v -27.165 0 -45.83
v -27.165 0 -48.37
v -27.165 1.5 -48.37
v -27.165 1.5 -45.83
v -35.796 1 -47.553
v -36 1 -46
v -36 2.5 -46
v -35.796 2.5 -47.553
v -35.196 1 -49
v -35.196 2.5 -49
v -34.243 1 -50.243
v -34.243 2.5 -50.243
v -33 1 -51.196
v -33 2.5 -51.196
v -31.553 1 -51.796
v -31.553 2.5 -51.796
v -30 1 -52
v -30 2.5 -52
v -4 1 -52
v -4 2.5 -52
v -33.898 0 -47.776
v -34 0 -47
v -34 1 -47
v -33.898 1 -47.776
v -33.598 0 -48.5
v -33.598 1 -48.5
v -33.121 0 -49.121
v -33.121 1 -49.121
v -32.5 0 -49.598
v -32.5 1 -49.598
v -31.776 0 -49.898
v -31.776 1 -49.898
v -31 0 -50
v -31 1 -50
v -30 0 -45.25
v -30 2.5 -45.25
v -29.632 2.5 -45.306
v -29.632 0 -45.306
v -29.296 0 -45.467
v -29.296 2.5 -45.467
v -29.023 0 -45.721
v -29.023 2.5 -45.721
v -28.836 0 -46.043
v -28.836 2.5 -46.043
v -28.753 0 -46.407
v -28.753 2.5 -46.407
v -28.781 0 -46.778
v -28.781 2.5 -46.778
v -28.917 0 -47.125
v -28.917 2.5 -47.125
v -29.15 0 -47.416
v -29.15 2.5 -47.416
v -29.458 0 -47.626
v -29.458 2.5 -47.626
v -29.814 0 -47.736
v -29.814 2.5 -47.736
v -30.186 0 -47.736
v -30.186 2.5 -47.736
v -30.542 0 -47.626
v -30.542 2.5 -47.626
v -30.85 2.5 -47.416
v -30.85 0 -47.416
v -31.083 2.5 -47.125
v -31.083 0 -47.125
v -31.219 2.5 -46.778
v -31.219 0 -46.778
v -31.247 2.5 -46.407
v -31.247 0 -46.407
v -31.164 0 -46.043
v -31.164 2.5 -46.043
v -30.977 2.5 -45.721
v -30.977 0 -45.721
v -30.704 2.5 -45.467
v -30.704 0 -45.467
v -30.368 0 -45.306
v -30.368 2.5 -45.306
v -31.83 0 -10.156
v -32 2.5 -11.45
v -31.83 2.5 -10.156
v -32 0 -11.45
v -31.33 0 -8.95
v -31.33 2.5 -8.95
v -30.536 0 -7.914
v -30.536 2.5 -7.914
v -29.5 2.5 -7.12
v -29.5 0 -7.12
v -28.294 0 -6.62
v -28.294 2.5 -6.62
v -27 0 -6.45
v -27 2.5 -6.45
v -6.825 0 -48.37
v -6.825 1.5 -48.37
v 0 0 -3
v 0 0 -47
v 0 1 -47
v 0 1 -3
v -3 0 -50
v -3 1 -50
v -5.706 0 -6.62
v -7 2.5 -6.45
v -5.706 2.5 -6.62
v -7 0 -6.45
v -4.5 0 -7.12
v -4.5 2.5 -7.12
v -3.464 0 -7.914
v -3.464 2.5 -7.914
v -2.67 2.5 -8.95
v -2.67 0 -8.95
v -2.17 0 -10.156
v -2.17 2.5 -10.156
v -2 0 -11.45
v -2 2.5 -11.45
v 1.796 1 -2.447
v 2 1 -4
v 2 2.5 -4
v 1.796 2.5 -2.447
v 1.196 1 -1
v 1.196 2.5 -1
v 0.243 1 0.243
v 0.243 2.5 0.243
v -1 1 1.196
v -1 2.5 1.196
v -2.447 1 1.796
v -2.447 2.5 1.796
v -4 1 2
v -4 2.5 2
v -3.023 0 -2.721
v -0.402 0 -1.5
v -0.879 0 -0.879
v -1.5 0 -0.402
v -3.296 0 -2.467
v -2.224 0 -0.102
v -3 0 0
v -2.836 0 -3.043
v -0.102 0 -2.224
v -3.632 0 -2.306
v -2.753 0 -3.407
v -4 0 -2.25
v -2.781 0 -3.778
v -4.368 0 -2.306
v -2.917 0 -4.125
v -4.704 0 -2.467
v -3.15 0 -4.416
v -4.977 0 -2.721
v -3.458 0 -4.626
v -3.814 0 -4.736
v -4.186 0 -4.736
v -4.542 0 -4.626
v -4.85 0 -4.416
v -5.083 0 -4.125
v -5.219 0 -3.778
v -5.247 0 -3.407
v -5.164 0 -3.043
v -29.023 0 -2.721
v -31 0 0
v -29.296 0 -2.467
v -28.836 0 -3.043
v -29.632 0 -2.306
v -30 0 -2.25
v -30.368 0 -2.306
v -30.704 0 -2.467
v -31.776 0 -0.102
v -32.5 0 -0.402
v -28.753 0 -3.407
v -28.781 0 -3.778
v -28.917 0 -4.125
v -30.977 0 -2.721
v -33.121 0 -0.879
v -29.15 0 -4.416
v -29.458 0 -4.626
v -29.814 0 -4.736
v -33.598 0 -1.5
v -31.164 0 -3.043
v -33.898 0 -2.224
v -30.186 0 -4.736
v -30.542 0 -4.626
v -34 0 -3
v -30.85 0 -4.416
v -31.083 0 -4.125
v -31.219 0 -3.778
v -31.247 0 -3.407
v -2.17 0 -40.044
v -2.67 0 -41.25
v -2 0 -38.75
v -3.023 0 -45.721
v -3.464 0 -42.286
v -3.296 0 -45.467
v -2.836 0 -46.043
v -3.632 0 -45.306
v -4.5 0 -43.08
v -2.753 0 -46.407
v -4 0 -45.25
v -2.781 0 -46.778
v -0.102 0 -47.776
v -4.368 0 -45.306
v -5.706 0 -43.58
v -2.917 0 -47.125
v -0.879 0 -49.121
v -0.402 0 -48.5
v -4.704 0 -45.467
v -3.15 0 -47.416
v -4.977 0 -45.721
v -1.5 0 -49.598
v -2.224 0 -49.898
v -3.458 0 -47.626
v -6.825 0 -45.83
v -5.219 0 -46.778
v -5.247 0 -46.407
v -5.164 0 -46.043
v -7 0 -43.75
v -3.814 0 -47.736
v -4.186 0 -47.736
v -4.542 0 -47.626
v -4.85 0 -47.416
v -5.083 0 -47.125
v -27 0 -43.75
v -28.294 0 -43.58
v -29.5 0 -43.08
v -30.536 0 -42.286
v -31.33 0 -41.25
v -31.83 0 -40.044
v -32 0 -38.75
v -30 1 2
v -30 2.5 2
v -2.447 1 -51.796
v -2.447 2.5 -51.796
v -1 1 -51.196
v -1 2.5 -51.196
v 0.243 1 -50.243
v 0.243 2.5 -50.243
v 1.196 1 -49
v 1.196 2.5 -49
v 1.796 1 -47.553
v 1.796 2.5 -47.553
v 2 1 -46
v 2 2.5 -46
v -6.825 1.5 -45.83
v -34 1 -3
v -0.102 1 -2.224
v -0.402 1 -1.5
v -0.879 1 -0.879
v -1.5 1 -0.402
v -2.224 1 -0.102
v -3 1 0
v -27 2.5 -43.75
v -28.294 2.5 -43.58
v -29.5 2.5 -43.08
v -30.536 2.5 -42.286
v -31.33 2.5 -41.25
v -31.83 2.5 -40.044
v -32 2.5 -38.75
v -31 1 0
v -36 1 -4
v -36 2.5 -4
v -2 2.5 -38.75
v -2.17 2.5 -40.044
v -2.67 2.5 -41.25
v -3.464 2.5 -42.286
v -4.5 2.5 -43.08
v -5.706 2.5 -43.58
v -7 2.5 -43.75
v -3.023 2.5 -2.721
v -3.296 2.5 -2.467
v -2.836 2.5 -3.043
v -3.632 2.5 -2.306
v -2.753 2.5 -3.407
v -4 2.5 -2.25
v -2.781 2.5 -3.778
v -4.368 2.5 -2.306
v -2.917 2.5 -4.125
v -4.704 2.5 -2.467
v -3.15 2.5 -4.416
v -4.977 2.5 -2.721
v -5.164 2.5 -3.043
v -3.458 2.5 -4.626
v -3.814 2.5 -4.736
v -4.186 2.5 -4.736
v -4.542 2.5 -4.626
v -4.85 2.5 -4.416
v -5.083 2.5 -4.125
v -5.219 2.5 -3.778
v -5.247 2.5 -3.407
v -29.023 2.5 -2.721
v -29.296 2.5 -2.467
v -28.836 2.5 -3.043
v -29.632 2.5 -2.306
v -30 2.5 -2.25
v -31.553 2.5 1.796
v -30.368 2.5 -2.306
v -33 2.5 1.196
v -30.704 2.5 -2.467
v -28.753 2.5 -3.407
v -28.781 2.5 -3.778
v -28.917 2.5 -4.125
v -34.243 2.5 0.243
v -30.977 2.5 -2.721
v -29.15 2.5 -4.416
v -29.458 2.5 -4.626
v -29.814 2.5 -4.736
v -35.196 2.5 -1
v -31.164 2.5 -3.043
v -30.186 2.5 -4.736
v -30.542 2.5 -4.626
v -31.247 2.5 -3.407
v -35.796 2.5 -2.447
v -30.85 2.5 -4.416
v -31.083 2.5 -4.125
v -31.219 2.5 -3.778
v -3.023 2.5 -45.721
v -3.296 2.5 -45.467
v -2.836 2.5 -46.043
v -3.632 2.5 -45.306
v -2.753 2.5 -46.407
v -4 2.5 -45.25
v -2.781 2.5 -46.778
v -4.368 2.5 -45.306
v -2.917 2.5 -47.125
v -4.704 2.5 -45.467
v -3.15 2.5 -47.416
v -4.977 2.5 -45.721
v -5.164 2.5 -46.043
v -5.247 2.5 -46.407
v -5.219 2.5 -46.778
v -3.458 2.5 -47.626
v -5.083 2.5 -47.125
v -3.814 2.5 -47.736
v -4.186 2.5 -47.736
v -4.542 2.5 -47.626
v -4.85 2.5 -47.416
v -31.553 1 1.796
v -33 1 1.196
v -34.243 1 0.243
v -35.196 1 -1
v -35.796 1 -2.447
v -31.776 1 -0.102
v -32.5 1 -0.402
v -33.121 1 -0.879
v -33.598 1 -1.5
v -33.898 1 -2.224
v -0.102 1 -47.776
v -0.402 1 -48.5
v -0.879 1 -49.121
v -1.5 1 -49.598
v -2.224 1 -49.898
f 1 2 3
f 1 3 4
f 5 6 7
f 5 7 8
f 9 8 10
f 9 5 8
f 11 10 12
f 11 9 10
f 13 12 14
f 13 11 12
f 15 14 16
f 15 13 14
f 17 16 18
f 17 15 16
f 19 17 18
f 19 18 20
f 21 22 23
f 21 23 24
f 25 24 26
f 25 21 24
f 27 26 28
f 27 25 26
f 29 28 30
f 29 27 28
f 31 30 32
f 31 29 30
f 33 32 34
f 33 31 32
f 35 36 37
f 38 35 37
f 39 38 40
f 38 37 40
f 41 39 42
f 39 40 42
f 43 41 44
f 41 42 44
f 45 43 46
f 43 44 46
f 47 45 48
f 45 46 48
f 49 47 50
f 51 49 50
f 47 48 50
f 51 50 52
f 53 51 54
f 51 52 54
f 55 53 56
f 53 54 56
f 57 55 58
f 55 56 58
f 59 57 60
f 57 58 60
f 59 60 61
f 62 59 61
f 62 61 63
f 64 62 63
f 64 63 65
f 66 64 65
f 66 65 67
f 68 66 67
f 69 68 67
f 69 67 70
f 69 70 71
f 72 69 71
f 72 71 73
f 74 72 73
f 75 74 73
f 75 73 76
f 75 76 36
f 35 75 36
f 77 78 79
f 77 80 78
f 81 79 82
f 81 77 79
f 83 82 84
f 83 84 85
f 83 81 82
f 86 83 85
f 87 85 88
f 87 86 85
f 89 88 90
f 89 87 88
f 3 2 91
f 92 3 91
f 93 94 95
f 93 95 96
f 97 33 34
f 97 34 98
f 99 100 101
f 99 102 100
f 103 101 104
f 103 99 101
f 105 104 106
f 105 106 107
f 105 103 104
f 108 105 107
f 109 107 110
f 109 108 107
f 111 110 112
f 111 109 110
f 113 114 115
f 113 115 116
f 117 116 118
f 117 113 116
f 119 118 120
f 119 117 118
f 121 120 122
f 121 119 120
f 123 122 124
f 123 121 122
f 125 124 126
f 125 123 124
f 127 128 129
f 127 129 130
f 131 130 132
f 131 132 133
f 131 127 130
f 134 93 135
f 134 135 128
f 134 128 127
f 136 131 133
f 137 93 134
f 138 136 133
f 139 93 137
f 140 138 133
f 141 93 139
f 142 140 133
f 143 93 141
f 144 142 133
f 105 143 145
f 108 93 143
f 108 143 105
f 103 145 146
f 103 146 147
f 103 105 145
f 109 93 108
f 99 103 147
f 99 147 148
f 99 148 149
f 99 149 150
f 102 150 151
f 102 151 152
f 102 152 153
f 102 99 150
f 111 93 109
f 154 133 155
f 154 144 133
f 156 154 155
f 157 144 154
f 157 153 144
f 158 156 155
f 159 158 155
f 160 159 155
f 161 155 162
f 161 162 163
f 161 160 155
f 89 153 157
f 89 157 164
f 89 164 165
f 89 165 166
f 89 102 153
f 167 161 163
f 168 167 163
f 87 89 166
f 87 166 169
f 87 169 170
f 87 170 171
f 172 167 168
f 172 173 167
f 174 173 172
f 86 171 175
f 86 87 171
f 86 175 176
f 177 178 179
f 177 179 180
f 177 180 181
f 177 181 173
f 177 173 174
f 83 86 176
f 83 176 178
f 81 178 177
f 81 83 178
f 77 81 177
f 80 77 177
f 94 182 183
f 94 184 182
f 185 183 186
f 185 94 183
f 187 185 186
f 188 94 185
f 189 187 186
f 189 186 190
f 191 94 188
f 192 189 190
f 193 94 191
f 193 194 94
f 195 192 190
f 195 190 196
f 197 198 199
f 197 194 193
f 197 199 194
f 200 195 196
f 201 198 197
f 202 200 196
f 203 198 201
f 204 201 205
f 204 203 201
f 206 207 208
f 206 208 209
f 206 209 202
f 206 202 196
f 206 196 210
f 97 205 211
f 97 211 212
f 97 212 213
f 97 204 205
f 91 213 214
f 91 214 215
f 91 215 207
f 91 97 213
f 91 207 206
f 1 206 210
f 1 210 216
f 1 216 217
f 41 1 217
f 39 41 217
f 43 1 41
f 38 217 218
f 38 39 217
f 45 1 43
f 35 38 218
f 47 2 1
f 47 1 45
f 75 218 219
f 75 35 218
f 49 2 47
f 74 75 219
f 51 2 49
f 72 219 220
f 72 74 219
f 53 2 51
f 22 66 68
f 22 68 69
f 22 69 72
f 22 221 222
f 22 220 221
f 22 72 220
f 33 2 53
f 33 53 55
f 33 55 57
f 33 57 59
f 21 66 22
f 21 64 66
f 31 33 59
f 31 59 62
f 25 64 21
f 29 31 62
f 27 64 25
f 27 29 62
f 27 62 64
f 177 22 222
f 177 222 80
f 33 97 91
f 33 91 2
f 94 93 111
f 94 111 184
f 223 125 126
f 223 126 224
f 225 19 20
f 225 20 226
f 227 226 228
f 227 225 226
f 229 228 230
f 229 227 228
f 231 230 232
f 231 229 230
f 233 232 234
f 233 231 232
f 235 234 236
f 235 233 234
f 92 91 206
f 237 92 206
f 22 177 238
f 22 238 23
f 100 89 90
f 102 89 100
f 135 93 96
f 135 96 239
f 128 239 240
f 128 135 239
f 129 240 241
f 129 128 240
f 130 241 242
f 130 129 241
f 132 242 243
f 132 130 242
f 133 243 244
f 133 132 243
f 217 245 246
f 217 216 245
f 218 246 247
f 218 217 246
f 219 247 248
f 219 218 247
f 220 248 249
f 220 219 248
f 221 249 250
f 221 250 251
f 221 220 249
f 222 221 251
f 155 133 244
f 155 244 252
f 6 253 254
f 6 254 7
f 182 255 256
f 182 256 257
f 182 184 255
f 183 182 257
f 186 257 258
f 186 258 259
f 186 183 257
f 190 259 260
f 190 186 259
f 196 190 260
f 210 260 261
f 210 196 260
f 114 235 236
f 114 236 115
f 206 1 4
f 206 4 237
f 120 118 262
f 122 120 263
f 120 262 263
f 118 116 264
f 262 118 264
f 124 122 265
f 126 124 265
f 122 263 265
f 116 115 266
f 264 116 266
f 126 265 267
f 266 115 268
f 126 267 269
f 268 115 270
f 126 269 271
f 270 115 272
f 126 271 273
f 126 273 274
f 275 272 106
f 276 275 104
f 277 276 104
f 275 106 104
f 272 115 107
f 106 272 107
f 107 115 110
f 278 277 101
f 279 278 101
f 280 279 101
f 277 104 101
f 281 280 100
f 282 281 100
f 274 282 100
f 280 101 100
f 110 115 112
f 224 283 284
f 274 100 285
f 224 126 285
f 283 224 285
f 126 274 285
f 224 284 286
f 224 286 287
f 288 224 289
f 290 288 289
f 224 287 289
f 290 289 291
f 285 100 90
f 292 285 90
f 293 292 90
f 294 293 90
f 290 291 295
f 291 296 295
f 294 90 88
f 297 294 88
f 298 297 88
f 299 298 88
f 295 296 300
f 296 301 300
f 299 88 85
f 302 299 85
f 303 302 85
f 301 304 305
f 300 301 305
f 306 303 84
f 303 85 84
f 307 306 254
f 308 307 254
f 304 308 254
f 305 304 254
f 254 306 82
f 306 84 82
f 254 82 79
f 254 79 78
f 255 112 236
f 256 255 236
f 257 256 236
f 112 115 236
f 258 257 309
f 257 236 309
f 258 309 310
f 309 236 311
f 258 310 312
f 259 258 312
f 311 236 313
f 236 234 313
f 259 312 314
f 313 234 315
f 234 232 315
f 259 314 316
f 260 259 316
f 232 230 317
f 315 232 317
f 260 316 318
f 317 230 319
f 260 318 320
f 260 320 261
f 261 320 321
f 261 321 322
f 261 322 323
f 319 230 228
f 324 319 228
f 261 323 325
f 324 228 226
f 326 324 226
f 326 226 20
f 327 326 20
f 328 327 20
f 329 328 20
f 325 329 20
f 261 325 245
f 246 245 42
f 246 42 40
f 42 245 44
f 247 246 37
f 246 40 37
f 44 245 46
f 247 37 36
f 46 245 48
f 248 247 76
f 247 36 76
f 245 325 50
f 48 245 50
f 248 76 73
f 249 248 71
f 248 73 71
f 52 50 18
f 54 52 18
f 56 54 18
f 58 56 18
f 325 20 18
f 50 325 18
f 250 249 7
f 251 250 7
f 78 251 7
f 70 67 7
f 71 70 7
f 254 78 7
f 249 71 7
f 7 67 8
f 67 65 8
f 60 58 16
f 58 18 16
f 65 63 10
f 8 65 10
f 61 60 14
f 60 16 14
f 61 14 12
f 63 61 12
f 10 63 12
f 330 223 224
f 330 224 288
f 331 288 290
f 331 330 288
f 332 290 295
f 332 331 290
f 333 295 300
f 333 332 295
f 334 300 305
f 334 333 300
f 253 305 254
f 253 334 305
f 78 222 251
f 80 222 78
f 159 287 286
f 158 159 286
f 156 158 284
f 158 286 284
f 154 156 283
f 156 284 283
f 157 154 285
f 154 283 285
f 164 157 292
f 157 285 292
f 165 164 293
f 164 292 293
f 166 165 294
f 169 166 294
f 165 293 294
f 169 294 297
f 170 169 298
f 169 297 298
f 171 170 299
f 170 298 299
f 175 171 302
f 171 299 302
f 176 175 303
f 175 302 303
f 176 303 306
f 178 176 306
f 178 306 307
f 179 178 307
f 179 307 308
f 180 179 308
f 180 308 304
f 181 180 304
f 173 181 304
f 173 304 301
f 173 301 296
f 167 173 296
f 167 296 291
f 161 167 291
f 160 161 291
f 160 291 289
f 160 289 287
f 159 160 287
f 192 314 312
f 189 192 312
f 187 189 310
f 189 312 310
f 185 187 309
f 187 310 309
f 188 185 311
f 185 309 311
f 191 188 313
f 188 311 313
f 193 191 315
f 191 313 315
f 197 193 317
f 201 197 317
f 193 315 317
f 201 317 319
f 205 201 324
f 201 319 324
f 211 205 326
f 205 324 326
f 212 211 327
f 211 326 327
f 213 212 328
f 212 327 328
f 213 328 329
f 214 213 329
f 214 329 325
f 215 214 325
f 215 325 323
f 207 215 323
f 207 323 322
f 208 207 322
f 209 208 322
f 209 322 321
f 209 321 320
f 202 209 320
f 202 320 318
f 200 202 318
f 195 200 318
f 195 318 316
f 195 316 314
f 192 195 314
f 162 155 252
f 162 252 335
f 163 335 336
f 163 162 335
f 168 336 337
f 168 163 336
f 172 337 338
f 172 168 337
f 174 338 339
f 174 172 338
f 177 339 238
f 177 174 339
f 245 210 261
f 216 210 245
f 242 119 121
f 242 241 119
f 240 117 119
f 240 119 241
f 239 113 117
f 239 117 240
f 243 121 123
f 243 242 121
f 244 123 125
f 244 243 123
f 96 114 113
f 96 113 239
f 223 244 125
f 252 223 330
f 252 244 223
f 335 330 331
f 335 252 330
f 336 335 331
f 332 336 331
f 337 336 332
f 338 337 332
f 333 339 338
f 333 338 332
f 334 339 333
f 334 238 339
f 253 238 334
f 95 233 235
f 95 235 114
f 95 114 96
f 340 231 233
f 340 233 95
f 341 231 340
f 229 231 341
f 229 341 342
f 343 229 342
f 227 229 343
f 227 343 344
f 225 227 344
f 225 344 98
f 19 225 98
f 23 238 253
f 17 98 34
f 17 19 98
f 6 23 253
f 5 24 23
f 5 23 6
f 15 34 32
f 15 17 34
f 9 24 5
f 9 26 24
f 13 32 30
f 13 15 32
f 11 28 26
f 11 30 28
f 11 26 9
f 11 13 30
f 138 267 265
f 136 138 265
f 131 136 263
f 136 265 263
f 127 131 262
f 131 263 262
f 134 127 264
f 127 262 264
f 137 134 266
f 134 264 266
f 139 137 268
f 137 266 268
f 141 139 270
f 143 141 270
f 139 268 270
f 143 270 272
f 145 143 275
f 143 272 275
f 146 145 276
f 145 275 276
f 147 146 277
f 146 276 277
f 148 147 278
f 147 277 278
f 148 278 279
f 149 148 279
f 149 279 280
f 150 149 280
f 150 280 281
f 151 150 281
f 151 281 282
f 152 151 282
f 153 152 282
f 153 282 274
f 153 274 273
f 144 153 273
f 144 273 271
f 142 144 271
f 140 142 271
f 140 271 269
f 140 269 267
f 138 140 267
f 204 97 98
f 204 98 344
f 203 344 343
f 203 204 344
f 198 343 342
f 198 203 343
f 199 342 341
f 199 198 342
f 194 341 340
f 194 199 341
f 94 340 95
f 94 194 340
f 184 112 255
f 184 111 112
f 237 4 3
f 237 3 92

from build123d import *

# Parameters (mm, degrees)
ESTRUSIONE_ESTRUSIONE1_DEPTH = 1
ESTRUSIONE_ESTRUSIONE2_DEPTH = 1.5
SCHIZZO4_W                   = 20.34
SCHIZZO4_H                   = 2.54
TAGLIO_ESTRUSIONE1_DEPTH     = 1.5
SCHIZZO5_R                   = 1.25
TAGLIO_ESTRUSIONE2_DEPTH     = 10


with BuildPart() as part:
    # Schizzo2 → Estrusione-Estrusione1 (new body)
    with BuildSketch(Plane(origin=(0, 0, 0), x_dir=(1, 0, 0), z_dir=(0, 1, 0))):
        with BuildLine():
            Line((-3, 0), (-31, 0))
            ThreePointArc((-31, 0), (-33.121320344, 0.878679656), (-34, 3))
            Line((-34, 3), (-34, 47))
            ThreePointArc((-34, 47), (-33.121320344, 49.121320344), (-31, 50))
            Line((-31, 50), (-3, 50))
            ThreePointArc((-3, 50), (-0.878679656, 49.121320344), (0, 47))
            Line((0, 47), (0, 3))
            ThreePointArc((0, 3), (-0.878679656, 0.878679656), (-3, 0))
        make_face()
        with BuildLine():
            Line((-27, 43.75), (-7, 43.75))
            ThreePointArc((-7, 43.75), (-3.464466094, 42.285533906), (-2, 38.75))
            Line((-2, 38.75), (-2, 11.45))
            ThreePointArc((-2, 11.45), (-3.464466094, 7.914466094), (-7, 6.45))
            Line((-7, 6.45), (-27, 6.45))
            ThreePointArc((-27, 6.45), (-30.535533906, 7.914466094), (-32, 11.45))
            Line((-32, 11.45), (-32, 38.75))
            ThreePointArc((-32, 38.75), (-30.535533906, 42.285533906), (-27, 43.75))
        make_face(mode=Mode.SUBTRACT)
    extrude(amount=ESTRUSIONE_ESTRUSIONE1_DEPTH)

    # Schizzo3 → Estrusione-Estrusione2 (add)
    with BuildSketch(Plane(origin=(0, 1, 0), x_dir=(1, 0, 0), z_dir=(0, 1, 0))):
        with BuildLine():
            Line((-30, 52), (-4, 52))
            ThreePointArc((-4, 52), (0.242640687, 50.242640687), (2, 46))
            Line((2, 46), (2, 4))
            ThreePointArc((2, 4), (0.242640687, -0.242640687), (-4, -2))
            Line((-4, -2), (-30, -2))
            ThreePointArc((-30, -2), (-34.242640687, -0.242640687), (-36, 4))
            Line((-36, 4), (-36, 46))
            ThreePointArc((-36, 46), (-34.242640687, 50.242640687), (-30, 52))
        make_face()
        with BuildLine():
            Line((-27, 6.45), (-7, 6.45))
            ThreePointArc((-7, 6.45), (-3.464466094, 7.914466094), (-2, 11.45))
            Line((-2, 11.45), (-2, 38.75))
            ThreePointArc((-2, 38.75), (-3.464466094, 42.285533906), (-7, 43.75))
            Line((-7, 43.75), (-27, 43.75))
            ThreePointArc((-27, 43.75), (-30.535533906, 42.285533906), (-32, 38.75))
            Line((-32, 38.75), (-32, 11.45))
            ThreePointArc((-32, 11.45), (-30.535533906, 7.914466094), (-27, 6.45))
        make_face(mode=Mode.SUBTRACT)
    extrude(amount=ESTRUSIONE_ESTRUSIONE2_DEPTH)

    # Schizzo4 → Taglio-Estrusione1 (cut)
    with BuildSketch(Plane.XZ):
        with Locations((-16.995, -47.1)):
            Rectangle(SCHIZZO4_W, SCHIZZO4_H)
    extrude(amount=-TAGLIO_ESTRUSIONE1_DEPTH, mode=Mode.SUBTRACT)

    # Schizzo5 → Taglio-Estrusione2 (cut)
    with BuildSketch(Plane(origin=(0, 2.5, 0), x_dir=(1, 0, 0), z_dir=(0, 1, 0))):
        with Locations(Location((-30, 46.5, 0), (0, 0, 270))):
            Circle(SCHIZZO5_R)
        with Locations(Location((-4, 46.5, 0), (0, 0, 270))):
            Circle(SCHIZZO5_R)
        with Locations(Location((-4, 3.5, 0), (0, 0, 270))):
            Circle(SCHIZZO5_R)
        with Locations(Location((-30, 3.5, 0), (0, 0, 270))):
            Circle(SCHIZZO5_R)
    extrude(amount=-TAGLIO_ESTRUSIONE2_DEPTH, mode=Mode.SUBTRACT)


solid = part.part
